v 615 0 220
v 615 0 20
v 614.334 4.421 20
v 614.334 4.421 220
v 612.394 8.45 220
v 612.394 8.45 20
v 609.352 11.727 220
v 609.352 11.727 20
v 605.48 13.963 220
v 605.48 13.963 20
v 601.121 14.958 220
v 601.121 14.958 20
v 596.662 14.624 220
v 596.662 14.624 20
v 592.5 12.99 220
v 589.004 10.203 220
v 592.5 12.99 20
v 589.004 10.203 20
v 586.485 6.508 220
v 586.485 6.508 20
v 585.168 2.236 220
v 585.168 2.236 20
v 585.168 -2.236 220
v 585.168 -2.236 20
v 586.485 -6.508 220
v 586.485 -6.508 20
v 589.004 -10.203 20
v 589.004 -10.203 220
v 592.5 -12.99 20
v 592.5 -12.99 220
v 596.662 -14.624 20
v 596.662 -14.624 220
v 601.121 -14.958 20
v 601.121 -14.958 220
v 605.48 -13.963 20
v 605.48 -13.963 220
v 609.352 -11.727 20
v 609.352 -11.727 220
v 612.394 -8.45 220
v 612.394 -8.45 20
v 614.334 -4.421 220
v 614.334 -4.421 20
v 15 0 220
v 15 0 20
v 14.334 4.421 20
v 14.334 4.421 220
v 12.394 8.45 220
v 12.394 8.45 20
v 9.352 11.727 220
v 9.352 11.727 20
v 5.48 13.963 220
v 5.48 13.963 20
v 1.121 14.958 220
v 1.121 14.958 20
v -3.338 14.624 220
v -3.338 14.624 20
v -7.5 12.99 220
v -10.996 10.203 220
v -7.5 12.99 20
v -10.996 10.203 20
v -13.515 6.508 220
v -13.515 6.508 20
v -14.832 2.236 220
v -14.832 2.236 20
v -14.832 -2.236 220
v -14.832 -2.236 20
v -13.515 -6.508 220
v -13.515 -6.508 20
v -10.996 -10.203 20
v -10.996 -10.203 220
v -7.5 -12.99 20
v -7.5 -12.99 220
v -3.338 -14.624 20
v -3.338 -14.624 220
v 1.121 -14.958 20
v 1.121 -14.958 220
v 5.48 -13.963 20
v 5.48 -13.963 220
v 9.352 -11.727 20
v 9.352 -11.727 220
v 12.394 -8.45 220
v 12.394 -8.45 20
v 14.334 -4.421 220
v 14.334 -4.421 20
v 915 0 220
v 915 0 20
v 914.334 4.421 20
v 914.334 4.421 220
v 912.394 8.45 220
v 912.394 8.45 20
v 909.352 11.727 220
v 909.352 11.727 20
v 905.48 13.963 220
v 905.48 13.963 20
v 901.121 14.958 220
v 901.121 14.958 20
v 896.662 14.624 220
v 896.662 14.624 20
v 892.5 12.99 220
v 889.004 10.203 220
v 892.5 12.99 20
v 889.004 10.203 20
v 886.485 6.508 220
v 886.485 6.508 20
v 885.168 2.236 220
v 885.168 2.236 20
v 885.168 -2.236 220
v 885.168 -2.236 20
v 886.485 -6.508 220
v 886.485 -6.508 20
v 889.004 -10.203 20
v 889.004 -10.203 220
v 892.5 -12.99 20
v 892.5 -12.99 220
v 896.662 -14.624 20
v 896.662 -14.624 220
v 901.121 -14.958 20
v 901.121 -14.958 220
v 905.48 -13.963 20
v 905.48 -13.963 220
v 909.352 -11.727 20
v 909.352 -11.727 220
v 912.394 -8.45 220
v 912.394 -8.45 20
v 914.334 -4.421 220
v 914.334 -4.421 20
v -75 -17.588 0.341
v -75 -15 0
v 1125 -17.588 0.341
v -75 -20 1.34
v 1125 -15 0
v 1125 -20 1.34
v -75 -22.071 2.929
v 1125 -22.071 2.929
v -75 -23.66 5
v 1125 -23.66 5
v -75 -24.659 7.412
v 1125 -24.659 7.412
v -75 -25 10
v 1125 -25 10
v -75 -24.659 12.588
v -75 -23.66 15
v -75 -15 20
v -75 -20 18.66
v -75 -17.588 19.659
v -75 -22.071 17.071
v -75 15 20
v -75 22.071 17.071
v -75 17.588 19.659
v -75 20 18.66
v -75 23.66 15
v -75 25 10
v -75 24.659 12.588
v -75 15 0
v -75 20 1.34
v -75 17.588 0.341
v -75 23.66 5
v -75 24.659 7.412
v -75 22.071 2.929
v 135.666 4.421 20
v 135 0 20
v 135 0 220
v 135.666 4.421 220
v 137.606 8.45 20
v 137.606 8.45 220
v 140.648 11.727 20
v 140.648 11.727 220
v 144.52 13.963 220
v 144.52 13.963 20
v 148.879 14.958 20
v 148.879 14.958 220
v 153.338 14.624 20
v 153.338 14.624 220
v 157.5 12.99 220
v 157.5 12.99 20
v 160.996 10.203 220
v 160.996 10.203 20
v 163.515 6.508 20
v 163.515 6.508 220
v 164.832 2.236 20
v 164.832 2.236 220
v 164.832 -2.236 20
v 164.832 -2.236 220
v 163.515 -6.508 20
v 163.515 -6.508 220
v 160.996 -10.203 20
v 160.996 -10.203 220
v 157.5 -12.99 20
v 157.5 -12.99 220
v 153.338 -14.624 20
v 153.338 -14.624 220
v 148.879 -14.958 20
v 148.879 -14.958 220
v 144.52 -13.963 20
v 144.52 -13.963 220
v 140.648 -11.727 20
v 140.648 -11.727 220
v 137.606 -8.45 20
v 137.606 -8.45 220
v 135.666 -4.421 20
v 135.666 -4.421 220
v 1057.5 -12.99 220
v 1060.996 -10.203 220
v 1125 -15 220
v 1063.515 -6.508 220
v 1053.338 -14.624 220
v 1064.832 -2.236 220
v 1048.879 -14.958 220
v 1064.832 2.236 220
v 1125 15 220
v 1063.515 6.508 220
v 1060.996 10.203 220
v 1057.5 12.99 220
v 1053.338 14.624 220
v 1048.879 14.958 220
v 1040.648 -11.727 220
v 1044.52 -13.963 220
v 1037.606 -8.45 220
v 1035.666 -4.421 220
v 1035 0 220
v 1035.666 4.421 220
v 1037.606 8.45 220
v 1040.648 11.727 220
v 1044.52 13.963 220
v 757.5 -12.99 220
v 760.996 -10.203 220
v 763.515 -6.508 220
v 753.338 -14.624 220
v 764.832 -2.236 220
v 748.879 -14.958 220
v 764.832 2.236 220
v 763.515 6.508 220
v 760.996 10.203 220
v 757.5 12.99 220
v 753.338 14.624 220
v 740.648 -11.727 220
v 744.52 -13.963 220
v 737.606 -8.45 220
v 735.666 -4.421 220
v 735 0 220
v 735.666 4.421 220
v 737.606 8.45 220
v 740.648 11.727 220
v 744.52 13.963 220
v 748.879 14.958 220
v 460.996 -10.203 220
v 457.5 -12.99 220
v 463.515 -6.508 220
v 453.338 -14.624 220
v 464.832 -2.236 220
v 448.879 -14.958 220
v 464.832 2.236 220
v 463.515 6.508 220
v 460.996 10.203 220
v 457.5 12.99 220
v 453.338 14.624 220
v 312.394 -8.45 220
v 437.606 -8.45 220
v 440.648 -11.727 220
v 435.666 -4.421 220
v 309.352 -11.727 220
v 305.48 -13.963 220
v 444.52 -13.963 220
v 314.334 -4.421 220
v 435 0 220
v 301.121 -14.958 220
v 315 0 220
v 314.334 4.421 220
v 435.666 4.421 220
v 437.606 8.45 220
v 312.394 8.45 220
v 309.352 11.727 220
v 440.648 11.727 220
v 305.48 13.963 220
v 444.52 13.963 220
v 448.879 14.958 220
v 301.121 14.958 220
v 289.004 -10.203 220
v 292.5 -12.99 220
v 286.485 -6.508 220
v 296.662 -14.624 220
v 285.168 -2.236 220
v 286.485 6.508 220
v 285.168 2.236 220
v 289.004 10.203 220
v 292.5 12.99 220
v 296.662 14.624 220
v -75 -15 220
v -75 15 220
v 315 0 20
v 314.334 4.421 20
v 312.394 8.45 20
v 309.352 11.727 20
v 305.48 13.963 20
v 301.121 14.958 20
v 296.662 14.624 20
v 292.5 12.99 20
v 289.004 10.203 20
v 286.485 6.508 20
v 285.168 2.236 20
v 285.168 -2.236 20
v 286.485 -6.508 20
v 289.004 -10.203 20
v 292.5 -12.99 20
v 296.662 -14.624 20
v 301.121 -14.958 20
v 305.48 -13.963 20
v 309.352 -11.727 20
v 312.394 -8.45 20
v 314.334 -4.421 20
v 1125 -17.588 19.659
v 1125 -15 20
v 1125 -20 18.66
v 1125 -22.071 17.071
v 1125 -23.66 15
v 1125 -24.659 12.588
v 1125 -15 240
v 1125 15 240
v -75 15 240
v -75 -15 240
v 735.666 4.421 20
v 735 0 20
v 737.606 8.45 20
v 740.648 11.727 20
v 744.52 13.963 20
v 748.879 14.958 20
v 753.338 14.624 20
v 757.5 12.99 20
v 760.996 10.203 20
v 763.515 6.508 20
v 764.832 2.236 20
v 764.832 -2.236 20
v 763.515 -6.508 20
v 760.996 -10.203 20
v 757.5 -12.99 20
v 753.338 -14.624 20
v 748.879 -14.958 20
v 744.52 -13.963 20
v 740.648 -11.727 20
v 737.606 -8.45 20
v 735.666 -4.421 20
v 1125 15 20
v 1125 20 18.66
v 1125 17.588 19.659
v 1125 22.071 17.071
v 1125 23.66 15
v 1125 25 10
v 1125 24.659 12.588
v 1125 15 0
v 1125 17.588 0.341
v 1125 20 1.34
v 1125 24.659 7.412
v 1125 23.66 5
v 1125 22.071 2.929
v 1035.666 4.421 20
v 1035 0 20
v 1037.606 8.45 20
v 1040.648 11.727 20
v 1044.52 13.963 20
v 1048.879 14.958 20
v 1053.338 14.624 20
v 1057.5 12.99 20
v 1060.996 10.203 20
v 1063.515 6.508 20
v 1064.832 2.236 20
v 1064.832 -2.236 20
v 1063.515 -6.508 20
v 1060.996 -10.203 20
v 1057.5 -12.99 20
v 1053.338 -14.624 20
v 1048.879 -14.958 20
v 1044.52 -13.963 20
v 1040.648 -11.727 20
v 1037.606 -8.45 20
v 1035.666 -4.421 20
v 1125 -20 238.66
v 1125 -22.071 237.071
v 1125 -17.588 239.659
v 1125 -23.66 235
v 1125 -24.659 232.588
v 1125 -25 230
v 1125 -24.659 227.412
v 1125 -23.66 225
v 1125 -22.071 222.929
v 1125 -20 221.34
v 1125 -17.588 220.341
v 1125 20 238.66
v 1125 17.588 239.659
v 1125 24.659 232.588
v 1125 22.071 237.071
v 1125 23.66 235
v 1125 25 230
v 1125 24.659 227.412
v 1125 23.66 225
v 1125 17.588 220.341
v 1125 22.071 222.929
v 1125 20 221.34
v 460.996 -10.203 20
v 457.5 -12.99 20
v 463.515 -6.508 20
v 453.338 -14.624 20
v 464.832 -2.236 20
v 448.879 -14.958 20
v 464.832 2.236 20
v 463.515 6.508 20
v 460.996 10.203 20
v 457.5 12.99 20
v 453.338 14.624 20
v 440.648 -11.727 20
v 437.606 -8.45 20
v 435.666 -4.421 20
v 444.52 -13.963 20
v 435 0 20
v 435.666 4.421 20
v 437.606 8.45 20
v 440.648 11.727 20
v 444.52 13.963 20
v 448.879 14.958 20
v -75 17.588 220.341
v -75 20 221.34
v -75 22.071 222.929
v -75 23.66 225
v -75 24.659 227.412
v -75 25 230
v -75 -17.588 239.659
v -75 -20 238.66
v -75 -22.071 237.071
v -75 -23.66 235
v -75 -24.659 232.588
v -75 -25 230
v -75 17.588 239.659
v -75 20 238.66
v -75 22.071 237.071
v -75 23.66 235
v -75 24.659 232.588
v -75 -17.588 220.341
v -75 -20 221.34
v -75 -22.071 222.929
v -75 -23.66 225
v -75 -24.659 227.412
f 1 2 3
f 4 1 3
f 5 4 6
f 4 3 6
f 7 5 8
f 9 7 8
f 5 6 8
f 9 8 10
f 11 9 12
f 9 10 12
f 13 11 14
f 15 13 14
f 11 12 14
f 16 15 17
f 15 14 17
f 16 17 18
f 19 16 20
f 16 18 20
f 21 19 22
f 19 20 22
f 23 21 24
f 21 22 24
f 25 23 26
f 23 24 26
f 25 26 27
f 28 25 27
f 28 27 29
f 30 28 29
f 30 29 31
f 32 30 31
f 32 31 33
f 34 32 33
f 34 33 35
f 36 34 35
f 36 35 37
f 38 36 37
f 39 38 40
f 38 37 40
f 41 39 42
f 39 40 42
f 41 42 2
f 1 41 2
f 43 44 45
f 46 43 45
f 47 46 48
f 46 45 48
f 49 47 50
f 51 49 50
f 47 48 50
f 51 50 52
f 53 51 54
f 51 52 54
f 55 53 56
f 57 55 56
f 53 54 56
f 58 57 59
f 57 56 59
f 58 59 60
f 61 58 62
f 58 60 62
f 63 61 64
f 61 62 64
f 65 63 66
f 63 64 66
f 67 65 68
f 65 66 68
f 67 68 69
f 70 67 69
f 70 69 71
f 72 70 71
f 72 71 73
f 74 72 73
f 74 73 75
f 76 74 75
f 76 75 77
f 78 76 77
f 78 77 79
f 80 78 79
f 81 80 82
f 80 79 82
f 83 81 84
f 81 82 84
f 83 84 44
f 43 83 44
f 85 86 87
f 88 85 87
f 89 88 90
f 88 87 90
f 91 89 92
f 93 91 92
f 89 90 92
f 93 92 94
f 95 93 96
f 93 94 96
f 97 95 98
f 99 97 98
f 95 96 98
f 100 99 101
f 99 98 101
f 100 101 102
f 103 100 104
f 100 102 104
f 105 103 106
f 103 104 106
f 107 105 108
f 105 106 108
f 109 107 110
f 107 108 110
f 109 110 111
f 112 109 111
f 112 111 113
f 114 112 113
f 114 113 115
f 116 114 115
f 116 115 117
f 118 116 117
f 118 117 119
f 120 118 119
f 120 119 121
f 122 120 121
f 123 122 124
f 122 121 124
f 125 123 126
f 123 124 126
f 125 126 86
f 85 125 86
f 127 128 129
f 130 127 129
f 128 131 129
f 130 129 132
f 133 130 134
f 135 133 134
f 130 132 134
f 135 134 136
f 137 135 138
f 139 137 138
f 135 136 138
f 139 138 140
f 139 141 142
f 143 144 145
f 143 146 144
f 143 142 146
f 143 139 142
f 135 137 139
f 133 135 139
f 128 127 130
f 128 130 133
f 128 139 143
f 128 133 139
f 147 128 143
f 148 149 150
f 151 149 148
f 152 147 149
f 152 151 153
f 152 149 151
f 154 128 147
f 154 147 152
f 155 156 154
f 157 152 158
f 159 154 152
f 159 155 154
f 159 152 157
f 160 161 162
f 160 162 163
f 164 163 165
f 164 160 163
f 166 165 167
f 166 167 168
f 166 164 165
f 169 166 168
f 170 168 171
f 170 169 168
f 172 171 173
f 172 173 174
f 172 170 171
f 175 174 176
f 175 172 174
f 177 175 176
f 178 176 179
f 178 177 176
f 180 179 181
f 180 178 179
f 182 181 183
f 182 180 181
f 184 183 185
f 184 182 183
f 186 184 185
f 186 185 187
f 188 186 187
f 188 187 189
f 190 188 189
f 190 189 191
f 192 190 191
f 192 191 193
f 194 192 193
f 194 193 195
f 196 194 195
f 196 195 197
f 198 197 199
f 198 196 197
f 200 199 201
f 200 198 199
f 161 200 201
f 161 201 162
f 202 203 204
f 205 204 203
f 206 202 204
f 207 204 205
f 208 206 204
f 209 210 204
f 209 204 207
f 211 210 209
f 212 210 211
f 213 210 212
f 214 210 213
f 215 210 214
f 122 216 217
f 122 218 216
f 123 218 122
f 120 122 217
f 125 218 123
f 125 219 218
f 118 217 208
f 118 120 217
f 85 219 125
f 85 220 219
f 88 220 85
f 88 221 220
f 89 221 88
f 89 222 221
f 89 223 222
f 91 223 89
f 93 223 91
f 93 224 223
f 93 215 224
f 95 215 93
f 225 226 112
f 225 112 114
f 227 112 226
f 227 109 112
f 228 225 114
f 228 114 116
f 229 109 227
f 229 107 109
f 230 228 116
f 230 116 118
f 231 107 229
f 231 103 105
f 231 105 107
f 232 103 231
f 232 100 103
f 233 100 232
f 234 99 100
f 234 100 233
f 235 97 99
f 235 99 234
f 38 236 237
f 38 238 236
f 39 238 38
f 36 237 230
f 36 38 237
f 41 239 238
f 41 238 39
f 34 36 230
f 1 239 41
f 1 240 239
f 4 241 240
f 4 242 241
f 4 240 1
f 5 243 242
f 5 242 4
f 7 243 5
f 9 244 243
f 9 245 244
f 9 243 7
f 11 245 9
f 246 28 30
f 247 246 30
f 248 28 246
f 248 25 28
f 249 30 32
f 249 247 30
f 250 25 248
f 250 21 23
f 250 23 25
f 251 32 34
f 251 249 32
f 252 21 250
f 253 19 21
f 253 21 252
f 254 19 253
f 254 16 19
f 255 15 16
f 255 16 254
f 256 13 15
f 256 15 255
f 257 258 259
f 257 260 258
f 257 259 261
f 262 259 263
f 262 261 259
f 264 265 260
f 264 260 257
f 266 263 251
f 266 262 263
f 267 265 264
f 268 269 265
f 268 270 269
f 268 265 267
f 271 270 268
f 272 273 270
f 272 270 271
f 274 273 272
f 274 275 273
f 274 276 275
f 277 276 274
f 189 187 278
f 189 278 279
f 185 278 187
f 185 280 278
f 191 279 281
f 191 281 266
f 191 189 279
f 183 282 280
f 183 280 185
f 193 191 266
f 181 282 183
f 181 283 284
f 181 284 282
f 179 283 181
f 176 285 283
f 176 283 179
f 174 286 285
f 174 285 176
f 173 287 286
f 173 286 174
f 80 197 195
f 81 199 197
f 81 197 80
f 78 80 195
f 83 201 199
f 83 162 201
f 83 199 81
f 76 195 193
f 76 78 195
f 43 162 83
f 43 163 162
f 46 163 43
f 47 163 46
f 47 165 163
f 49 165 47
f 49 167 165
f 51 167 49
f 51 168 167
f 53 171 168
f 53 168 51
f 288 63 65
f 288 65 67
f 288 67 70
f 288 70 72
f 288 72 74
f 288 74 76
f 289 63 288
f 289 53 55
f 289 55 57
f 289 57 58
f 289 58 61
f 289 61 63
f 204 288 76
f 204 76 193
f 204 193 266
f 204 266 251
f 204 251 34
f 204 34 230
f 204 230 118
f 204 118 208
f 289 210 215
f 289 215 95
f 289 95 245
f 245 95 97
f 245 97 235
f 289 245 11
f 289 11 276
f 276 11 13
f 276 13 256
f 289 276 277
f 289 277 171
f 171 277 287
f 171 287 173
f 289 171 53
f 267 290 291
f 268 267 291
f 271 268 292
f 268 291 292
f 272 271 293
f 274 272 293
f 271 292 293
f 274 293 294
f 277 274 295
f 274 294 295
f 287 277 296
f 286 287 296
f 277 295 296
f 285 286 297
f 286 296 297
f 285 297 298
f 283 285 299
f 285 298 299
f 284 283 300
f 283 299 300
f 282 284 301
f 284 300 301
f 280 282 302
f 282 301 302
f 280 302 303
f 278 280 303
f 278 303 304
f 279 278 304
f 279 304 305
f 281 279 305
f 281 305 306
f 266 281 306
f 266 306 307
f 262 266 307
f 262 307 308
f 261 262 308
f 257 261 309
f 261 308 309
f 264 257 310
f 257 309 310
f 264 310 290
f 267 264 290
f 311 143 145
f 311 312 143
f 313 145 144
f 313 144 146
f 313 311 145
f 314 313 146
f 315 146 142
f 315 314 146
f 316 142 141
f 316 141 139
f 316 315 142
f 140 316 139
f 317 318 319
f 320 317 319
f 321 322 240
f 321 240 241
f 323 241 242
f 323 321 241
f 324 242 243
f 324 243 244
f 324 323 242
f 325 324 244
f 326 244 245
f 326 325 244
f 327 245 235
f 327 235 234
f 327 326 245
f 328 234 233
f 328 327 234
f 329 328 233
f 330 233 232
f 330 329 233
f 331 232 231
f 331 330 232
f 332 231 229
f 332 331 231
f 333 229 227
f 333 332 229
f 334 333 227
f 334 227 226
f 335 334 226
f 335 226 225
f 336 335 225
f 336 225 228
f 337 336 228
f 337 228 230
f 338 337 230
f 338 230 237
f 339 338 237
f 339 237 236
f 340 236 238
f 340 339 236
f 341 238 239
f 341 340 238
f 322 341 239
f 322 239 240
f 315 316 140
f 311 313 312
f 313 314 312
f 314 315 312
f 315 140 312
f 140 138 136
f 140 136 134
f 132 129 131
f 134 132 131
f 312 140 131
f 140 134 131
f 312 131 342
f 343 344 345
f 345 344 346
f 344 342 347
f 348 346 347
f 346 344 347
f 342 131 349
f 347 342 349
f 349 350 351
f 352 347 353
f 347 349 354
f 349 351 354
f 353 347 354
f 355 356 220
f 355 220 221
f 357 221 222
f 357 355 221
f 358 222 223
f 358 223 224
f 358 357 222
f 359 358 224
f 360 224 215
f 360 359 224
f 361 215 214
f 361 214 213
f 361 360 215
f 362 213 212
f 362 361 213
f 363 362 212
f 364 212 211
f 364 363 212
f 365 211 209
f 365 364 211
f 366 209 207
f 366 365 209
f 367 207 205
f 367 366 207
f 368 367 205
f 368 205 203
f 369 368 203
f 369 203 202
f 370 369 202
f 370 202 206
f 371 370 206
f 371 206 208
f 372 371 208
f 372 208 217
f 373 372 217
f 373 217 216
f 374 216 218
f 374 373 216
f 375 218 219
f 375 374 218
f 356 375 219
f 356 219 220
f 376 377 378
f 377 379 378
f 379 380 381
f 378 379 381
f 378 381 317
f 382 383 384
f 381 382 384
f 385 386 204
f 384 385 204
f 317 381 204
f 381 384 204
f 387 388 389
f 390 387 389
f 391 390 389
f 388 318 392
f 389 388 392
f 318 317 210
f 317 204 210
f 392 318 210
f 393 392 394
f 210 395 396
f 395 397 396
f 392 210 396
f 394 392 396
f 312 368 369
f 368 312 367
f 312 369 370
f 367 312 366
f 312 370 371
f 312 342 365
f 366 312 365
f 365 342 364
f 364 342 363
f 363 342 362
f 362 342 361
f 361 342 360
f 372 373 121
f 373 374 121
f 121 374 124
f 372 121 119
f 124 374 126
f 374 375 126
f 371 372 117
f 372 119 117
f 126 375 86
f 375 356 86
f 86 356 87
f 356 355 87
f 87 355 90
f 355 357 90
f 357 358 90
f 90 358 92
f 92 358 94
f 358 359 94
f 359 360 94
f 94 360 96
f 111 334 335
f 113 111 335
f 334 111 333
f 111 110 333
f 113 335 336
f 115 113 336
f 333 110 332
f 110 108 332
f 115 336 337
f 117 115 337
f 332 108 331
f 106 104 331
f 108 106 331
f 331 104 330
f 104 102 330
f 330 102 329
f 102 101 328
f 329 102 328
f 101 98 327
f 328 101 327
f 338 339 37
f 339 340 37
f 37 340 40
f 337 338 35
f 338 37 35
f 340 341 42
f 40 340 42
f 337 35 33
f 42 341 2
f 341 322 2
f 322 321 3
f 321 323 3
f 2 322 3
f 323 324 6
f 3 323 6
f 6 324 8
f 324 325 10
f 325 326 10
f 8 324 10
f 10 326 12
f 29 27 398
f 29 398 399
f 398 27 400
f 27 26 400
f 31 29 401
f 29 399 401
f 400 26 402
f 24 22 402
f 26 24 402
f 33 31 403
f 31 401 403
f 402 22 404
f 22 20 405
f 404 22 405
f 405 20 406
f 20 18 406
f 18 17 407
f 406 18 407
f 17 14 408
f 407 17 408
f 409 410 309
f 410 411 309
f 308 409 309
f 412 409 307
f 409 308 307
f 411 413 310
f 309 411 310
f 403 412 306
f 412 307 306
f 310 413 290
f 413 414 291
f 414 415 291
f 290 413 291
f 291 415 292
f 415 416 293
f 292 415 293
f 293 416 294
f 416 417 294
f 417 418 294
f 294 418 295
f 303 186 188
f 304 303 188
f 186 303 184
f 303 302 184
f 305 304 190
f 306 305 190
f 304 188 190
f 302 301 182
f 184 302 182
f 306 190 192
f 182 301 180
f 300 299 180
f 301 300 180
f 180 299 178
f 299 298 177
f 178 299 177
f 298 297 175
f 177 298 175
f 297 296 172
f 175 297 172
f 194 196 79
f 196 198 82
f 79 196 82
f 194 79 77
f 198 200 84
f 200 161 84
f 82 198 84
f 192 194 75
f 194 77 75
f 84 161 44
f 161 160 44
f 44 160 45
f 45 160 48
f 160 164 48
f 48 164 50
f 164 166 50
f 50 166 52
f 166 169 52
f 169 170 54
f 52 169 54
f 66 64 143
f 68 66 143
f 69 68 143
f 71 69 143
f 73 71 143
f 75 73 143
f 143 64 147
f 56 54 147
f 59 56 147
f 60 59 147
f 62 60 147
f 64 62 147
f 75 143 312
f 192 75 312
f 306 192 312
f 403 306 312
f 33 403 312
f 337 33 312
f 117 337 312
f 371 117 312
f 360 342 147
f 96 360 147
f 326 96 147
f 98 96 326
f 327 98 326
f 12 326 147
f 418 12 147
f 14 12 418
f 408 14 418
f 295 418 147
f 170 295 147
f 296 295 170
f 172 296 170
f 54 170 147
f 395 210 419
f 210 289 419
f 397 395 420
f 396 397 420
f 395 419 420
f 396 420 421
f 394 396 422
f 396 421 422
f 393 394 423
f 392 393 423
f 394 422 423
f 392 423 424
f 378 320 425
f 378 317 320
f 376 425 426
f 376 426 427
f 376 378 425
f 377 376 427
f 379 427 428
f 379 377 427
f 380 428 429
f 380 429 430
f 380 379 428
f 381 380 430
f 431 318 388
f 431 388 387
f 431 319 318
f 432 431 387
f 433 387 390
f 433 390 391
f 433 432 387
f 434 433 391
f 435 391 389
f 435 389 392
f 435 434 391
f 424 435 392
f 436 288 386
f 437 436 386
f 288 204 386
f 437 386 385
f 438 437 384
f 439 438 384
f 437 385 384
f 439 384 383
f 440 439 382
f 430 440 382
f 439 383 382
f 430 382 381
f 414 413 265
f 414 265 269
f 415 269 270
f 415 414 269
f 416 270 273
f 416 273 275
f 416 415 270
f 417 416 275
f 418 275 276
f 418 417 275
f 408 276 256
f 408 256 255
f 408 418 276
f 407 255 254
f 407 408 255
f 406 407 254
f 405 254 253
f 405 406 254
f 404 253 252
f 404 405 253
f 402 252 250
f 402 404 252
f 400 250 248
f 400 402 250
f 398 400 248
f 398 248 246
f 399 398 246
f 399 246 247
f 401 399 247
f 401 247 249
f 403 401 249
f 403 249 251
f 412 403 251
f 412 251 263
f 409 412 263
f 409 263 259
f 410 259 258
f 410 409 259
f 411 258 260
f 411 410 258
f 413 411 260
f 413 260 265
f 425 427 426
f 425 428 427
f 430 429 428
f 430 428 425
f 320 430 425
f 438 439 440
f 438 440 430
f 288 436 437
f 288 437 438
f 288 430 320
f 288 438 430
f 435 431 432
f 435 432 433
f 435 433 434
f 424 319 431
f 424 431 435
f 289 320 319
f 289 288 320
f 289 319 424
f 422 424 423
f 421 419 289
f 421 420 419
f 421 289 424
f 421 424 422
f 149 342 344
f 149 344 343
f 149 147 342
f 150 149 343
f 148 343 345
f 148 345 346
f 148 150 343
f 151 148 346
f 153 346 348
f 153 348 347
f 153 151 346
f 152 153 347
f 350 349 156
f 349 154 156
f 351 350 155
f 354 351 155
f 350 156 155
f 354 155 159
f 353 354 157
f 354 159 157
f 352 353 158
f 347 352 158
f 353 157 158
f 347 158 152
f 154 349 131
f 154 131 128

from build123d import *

# Parameters (mm, degrees)
SKETCH3_W           = 150
SKETCH3_H           = 50
BOSS_EXTRUDE1_DEPTH = 20
SKETCH4_R           = 15
BOSS_EXTRUDE2_DEPTH = 200
SKETCH5_W           = 150
SKETCH5_H           = 50
BOSS_EXTRUDE3_DEPTH = 20
FILLET2_R           = 10


with BuildPart() as part:
    # Sketch3 → Boss-Extrude1 (new body)
    with BuildSketch(Plane.XY):
        Rectangle(SKETCH3_W, SKETCH3_H)
    extrude(amount=BOSS_EXTRUDE1_DEPTH)

    # Sketch4 → Boss-Extrude2 (add)
    with BuildSketch(Plane.XY.offset(20)):
        Circle(SKETCH4_R)
    extrude(amount=BOSS_EXTRUDE2_DEPTH)

    # Sketch5 → Boss-Extrude3 (add)
    with BuildSketch(Plane.XY.offset(220)):
        Rectangle(SKETCH5_W, SKETCH5_H)
    extrude(amount=BOSS_EXTRUDE3_DEPTH)

    # Mirror1: part across plane


with BuildPart() as part_1:
    add(part.part)
    add(part.part.mirror(Plane(origin=(75, -25, 20), x_dir=(0, 0, 1), z_dir=(-1, 0, 0))))

    # Mirror2: part across plane


with BuildPart() as part_2:
    add(part_1.part)
    add(part_1.part.mirror(Plane(origin=(225, 25, 240), x_dir=(0, 0, 1), z_dir=(-1, 0, 0))))

    # Mirror3: part across plane


with BuildPart() as part_3:
    add(part_2.part)
    add(part_2.part.mirror(Plane(origin=(525, 25, 240), x_dir=(0, 0, 1), z_dir=(-1, 0, 0))))

    # Fillet2
    fillet2_edges = [part_3.edges().sort_by_distance(p)[0] for p in [
        (525, -25, 20),
        (525, -25, 0),
        (525, 25, 0),
        (525, 25, 20),
        (525, 25, 220),
        (525, 25, 240),
        (525, -25, 220),
        (525, -25, 240),
    ]]
    fillet(fillet2_edges, radius=FILLET2_R - 0.0001)  # a hair under: the kernel refuses the full size


solid = part_3.part
